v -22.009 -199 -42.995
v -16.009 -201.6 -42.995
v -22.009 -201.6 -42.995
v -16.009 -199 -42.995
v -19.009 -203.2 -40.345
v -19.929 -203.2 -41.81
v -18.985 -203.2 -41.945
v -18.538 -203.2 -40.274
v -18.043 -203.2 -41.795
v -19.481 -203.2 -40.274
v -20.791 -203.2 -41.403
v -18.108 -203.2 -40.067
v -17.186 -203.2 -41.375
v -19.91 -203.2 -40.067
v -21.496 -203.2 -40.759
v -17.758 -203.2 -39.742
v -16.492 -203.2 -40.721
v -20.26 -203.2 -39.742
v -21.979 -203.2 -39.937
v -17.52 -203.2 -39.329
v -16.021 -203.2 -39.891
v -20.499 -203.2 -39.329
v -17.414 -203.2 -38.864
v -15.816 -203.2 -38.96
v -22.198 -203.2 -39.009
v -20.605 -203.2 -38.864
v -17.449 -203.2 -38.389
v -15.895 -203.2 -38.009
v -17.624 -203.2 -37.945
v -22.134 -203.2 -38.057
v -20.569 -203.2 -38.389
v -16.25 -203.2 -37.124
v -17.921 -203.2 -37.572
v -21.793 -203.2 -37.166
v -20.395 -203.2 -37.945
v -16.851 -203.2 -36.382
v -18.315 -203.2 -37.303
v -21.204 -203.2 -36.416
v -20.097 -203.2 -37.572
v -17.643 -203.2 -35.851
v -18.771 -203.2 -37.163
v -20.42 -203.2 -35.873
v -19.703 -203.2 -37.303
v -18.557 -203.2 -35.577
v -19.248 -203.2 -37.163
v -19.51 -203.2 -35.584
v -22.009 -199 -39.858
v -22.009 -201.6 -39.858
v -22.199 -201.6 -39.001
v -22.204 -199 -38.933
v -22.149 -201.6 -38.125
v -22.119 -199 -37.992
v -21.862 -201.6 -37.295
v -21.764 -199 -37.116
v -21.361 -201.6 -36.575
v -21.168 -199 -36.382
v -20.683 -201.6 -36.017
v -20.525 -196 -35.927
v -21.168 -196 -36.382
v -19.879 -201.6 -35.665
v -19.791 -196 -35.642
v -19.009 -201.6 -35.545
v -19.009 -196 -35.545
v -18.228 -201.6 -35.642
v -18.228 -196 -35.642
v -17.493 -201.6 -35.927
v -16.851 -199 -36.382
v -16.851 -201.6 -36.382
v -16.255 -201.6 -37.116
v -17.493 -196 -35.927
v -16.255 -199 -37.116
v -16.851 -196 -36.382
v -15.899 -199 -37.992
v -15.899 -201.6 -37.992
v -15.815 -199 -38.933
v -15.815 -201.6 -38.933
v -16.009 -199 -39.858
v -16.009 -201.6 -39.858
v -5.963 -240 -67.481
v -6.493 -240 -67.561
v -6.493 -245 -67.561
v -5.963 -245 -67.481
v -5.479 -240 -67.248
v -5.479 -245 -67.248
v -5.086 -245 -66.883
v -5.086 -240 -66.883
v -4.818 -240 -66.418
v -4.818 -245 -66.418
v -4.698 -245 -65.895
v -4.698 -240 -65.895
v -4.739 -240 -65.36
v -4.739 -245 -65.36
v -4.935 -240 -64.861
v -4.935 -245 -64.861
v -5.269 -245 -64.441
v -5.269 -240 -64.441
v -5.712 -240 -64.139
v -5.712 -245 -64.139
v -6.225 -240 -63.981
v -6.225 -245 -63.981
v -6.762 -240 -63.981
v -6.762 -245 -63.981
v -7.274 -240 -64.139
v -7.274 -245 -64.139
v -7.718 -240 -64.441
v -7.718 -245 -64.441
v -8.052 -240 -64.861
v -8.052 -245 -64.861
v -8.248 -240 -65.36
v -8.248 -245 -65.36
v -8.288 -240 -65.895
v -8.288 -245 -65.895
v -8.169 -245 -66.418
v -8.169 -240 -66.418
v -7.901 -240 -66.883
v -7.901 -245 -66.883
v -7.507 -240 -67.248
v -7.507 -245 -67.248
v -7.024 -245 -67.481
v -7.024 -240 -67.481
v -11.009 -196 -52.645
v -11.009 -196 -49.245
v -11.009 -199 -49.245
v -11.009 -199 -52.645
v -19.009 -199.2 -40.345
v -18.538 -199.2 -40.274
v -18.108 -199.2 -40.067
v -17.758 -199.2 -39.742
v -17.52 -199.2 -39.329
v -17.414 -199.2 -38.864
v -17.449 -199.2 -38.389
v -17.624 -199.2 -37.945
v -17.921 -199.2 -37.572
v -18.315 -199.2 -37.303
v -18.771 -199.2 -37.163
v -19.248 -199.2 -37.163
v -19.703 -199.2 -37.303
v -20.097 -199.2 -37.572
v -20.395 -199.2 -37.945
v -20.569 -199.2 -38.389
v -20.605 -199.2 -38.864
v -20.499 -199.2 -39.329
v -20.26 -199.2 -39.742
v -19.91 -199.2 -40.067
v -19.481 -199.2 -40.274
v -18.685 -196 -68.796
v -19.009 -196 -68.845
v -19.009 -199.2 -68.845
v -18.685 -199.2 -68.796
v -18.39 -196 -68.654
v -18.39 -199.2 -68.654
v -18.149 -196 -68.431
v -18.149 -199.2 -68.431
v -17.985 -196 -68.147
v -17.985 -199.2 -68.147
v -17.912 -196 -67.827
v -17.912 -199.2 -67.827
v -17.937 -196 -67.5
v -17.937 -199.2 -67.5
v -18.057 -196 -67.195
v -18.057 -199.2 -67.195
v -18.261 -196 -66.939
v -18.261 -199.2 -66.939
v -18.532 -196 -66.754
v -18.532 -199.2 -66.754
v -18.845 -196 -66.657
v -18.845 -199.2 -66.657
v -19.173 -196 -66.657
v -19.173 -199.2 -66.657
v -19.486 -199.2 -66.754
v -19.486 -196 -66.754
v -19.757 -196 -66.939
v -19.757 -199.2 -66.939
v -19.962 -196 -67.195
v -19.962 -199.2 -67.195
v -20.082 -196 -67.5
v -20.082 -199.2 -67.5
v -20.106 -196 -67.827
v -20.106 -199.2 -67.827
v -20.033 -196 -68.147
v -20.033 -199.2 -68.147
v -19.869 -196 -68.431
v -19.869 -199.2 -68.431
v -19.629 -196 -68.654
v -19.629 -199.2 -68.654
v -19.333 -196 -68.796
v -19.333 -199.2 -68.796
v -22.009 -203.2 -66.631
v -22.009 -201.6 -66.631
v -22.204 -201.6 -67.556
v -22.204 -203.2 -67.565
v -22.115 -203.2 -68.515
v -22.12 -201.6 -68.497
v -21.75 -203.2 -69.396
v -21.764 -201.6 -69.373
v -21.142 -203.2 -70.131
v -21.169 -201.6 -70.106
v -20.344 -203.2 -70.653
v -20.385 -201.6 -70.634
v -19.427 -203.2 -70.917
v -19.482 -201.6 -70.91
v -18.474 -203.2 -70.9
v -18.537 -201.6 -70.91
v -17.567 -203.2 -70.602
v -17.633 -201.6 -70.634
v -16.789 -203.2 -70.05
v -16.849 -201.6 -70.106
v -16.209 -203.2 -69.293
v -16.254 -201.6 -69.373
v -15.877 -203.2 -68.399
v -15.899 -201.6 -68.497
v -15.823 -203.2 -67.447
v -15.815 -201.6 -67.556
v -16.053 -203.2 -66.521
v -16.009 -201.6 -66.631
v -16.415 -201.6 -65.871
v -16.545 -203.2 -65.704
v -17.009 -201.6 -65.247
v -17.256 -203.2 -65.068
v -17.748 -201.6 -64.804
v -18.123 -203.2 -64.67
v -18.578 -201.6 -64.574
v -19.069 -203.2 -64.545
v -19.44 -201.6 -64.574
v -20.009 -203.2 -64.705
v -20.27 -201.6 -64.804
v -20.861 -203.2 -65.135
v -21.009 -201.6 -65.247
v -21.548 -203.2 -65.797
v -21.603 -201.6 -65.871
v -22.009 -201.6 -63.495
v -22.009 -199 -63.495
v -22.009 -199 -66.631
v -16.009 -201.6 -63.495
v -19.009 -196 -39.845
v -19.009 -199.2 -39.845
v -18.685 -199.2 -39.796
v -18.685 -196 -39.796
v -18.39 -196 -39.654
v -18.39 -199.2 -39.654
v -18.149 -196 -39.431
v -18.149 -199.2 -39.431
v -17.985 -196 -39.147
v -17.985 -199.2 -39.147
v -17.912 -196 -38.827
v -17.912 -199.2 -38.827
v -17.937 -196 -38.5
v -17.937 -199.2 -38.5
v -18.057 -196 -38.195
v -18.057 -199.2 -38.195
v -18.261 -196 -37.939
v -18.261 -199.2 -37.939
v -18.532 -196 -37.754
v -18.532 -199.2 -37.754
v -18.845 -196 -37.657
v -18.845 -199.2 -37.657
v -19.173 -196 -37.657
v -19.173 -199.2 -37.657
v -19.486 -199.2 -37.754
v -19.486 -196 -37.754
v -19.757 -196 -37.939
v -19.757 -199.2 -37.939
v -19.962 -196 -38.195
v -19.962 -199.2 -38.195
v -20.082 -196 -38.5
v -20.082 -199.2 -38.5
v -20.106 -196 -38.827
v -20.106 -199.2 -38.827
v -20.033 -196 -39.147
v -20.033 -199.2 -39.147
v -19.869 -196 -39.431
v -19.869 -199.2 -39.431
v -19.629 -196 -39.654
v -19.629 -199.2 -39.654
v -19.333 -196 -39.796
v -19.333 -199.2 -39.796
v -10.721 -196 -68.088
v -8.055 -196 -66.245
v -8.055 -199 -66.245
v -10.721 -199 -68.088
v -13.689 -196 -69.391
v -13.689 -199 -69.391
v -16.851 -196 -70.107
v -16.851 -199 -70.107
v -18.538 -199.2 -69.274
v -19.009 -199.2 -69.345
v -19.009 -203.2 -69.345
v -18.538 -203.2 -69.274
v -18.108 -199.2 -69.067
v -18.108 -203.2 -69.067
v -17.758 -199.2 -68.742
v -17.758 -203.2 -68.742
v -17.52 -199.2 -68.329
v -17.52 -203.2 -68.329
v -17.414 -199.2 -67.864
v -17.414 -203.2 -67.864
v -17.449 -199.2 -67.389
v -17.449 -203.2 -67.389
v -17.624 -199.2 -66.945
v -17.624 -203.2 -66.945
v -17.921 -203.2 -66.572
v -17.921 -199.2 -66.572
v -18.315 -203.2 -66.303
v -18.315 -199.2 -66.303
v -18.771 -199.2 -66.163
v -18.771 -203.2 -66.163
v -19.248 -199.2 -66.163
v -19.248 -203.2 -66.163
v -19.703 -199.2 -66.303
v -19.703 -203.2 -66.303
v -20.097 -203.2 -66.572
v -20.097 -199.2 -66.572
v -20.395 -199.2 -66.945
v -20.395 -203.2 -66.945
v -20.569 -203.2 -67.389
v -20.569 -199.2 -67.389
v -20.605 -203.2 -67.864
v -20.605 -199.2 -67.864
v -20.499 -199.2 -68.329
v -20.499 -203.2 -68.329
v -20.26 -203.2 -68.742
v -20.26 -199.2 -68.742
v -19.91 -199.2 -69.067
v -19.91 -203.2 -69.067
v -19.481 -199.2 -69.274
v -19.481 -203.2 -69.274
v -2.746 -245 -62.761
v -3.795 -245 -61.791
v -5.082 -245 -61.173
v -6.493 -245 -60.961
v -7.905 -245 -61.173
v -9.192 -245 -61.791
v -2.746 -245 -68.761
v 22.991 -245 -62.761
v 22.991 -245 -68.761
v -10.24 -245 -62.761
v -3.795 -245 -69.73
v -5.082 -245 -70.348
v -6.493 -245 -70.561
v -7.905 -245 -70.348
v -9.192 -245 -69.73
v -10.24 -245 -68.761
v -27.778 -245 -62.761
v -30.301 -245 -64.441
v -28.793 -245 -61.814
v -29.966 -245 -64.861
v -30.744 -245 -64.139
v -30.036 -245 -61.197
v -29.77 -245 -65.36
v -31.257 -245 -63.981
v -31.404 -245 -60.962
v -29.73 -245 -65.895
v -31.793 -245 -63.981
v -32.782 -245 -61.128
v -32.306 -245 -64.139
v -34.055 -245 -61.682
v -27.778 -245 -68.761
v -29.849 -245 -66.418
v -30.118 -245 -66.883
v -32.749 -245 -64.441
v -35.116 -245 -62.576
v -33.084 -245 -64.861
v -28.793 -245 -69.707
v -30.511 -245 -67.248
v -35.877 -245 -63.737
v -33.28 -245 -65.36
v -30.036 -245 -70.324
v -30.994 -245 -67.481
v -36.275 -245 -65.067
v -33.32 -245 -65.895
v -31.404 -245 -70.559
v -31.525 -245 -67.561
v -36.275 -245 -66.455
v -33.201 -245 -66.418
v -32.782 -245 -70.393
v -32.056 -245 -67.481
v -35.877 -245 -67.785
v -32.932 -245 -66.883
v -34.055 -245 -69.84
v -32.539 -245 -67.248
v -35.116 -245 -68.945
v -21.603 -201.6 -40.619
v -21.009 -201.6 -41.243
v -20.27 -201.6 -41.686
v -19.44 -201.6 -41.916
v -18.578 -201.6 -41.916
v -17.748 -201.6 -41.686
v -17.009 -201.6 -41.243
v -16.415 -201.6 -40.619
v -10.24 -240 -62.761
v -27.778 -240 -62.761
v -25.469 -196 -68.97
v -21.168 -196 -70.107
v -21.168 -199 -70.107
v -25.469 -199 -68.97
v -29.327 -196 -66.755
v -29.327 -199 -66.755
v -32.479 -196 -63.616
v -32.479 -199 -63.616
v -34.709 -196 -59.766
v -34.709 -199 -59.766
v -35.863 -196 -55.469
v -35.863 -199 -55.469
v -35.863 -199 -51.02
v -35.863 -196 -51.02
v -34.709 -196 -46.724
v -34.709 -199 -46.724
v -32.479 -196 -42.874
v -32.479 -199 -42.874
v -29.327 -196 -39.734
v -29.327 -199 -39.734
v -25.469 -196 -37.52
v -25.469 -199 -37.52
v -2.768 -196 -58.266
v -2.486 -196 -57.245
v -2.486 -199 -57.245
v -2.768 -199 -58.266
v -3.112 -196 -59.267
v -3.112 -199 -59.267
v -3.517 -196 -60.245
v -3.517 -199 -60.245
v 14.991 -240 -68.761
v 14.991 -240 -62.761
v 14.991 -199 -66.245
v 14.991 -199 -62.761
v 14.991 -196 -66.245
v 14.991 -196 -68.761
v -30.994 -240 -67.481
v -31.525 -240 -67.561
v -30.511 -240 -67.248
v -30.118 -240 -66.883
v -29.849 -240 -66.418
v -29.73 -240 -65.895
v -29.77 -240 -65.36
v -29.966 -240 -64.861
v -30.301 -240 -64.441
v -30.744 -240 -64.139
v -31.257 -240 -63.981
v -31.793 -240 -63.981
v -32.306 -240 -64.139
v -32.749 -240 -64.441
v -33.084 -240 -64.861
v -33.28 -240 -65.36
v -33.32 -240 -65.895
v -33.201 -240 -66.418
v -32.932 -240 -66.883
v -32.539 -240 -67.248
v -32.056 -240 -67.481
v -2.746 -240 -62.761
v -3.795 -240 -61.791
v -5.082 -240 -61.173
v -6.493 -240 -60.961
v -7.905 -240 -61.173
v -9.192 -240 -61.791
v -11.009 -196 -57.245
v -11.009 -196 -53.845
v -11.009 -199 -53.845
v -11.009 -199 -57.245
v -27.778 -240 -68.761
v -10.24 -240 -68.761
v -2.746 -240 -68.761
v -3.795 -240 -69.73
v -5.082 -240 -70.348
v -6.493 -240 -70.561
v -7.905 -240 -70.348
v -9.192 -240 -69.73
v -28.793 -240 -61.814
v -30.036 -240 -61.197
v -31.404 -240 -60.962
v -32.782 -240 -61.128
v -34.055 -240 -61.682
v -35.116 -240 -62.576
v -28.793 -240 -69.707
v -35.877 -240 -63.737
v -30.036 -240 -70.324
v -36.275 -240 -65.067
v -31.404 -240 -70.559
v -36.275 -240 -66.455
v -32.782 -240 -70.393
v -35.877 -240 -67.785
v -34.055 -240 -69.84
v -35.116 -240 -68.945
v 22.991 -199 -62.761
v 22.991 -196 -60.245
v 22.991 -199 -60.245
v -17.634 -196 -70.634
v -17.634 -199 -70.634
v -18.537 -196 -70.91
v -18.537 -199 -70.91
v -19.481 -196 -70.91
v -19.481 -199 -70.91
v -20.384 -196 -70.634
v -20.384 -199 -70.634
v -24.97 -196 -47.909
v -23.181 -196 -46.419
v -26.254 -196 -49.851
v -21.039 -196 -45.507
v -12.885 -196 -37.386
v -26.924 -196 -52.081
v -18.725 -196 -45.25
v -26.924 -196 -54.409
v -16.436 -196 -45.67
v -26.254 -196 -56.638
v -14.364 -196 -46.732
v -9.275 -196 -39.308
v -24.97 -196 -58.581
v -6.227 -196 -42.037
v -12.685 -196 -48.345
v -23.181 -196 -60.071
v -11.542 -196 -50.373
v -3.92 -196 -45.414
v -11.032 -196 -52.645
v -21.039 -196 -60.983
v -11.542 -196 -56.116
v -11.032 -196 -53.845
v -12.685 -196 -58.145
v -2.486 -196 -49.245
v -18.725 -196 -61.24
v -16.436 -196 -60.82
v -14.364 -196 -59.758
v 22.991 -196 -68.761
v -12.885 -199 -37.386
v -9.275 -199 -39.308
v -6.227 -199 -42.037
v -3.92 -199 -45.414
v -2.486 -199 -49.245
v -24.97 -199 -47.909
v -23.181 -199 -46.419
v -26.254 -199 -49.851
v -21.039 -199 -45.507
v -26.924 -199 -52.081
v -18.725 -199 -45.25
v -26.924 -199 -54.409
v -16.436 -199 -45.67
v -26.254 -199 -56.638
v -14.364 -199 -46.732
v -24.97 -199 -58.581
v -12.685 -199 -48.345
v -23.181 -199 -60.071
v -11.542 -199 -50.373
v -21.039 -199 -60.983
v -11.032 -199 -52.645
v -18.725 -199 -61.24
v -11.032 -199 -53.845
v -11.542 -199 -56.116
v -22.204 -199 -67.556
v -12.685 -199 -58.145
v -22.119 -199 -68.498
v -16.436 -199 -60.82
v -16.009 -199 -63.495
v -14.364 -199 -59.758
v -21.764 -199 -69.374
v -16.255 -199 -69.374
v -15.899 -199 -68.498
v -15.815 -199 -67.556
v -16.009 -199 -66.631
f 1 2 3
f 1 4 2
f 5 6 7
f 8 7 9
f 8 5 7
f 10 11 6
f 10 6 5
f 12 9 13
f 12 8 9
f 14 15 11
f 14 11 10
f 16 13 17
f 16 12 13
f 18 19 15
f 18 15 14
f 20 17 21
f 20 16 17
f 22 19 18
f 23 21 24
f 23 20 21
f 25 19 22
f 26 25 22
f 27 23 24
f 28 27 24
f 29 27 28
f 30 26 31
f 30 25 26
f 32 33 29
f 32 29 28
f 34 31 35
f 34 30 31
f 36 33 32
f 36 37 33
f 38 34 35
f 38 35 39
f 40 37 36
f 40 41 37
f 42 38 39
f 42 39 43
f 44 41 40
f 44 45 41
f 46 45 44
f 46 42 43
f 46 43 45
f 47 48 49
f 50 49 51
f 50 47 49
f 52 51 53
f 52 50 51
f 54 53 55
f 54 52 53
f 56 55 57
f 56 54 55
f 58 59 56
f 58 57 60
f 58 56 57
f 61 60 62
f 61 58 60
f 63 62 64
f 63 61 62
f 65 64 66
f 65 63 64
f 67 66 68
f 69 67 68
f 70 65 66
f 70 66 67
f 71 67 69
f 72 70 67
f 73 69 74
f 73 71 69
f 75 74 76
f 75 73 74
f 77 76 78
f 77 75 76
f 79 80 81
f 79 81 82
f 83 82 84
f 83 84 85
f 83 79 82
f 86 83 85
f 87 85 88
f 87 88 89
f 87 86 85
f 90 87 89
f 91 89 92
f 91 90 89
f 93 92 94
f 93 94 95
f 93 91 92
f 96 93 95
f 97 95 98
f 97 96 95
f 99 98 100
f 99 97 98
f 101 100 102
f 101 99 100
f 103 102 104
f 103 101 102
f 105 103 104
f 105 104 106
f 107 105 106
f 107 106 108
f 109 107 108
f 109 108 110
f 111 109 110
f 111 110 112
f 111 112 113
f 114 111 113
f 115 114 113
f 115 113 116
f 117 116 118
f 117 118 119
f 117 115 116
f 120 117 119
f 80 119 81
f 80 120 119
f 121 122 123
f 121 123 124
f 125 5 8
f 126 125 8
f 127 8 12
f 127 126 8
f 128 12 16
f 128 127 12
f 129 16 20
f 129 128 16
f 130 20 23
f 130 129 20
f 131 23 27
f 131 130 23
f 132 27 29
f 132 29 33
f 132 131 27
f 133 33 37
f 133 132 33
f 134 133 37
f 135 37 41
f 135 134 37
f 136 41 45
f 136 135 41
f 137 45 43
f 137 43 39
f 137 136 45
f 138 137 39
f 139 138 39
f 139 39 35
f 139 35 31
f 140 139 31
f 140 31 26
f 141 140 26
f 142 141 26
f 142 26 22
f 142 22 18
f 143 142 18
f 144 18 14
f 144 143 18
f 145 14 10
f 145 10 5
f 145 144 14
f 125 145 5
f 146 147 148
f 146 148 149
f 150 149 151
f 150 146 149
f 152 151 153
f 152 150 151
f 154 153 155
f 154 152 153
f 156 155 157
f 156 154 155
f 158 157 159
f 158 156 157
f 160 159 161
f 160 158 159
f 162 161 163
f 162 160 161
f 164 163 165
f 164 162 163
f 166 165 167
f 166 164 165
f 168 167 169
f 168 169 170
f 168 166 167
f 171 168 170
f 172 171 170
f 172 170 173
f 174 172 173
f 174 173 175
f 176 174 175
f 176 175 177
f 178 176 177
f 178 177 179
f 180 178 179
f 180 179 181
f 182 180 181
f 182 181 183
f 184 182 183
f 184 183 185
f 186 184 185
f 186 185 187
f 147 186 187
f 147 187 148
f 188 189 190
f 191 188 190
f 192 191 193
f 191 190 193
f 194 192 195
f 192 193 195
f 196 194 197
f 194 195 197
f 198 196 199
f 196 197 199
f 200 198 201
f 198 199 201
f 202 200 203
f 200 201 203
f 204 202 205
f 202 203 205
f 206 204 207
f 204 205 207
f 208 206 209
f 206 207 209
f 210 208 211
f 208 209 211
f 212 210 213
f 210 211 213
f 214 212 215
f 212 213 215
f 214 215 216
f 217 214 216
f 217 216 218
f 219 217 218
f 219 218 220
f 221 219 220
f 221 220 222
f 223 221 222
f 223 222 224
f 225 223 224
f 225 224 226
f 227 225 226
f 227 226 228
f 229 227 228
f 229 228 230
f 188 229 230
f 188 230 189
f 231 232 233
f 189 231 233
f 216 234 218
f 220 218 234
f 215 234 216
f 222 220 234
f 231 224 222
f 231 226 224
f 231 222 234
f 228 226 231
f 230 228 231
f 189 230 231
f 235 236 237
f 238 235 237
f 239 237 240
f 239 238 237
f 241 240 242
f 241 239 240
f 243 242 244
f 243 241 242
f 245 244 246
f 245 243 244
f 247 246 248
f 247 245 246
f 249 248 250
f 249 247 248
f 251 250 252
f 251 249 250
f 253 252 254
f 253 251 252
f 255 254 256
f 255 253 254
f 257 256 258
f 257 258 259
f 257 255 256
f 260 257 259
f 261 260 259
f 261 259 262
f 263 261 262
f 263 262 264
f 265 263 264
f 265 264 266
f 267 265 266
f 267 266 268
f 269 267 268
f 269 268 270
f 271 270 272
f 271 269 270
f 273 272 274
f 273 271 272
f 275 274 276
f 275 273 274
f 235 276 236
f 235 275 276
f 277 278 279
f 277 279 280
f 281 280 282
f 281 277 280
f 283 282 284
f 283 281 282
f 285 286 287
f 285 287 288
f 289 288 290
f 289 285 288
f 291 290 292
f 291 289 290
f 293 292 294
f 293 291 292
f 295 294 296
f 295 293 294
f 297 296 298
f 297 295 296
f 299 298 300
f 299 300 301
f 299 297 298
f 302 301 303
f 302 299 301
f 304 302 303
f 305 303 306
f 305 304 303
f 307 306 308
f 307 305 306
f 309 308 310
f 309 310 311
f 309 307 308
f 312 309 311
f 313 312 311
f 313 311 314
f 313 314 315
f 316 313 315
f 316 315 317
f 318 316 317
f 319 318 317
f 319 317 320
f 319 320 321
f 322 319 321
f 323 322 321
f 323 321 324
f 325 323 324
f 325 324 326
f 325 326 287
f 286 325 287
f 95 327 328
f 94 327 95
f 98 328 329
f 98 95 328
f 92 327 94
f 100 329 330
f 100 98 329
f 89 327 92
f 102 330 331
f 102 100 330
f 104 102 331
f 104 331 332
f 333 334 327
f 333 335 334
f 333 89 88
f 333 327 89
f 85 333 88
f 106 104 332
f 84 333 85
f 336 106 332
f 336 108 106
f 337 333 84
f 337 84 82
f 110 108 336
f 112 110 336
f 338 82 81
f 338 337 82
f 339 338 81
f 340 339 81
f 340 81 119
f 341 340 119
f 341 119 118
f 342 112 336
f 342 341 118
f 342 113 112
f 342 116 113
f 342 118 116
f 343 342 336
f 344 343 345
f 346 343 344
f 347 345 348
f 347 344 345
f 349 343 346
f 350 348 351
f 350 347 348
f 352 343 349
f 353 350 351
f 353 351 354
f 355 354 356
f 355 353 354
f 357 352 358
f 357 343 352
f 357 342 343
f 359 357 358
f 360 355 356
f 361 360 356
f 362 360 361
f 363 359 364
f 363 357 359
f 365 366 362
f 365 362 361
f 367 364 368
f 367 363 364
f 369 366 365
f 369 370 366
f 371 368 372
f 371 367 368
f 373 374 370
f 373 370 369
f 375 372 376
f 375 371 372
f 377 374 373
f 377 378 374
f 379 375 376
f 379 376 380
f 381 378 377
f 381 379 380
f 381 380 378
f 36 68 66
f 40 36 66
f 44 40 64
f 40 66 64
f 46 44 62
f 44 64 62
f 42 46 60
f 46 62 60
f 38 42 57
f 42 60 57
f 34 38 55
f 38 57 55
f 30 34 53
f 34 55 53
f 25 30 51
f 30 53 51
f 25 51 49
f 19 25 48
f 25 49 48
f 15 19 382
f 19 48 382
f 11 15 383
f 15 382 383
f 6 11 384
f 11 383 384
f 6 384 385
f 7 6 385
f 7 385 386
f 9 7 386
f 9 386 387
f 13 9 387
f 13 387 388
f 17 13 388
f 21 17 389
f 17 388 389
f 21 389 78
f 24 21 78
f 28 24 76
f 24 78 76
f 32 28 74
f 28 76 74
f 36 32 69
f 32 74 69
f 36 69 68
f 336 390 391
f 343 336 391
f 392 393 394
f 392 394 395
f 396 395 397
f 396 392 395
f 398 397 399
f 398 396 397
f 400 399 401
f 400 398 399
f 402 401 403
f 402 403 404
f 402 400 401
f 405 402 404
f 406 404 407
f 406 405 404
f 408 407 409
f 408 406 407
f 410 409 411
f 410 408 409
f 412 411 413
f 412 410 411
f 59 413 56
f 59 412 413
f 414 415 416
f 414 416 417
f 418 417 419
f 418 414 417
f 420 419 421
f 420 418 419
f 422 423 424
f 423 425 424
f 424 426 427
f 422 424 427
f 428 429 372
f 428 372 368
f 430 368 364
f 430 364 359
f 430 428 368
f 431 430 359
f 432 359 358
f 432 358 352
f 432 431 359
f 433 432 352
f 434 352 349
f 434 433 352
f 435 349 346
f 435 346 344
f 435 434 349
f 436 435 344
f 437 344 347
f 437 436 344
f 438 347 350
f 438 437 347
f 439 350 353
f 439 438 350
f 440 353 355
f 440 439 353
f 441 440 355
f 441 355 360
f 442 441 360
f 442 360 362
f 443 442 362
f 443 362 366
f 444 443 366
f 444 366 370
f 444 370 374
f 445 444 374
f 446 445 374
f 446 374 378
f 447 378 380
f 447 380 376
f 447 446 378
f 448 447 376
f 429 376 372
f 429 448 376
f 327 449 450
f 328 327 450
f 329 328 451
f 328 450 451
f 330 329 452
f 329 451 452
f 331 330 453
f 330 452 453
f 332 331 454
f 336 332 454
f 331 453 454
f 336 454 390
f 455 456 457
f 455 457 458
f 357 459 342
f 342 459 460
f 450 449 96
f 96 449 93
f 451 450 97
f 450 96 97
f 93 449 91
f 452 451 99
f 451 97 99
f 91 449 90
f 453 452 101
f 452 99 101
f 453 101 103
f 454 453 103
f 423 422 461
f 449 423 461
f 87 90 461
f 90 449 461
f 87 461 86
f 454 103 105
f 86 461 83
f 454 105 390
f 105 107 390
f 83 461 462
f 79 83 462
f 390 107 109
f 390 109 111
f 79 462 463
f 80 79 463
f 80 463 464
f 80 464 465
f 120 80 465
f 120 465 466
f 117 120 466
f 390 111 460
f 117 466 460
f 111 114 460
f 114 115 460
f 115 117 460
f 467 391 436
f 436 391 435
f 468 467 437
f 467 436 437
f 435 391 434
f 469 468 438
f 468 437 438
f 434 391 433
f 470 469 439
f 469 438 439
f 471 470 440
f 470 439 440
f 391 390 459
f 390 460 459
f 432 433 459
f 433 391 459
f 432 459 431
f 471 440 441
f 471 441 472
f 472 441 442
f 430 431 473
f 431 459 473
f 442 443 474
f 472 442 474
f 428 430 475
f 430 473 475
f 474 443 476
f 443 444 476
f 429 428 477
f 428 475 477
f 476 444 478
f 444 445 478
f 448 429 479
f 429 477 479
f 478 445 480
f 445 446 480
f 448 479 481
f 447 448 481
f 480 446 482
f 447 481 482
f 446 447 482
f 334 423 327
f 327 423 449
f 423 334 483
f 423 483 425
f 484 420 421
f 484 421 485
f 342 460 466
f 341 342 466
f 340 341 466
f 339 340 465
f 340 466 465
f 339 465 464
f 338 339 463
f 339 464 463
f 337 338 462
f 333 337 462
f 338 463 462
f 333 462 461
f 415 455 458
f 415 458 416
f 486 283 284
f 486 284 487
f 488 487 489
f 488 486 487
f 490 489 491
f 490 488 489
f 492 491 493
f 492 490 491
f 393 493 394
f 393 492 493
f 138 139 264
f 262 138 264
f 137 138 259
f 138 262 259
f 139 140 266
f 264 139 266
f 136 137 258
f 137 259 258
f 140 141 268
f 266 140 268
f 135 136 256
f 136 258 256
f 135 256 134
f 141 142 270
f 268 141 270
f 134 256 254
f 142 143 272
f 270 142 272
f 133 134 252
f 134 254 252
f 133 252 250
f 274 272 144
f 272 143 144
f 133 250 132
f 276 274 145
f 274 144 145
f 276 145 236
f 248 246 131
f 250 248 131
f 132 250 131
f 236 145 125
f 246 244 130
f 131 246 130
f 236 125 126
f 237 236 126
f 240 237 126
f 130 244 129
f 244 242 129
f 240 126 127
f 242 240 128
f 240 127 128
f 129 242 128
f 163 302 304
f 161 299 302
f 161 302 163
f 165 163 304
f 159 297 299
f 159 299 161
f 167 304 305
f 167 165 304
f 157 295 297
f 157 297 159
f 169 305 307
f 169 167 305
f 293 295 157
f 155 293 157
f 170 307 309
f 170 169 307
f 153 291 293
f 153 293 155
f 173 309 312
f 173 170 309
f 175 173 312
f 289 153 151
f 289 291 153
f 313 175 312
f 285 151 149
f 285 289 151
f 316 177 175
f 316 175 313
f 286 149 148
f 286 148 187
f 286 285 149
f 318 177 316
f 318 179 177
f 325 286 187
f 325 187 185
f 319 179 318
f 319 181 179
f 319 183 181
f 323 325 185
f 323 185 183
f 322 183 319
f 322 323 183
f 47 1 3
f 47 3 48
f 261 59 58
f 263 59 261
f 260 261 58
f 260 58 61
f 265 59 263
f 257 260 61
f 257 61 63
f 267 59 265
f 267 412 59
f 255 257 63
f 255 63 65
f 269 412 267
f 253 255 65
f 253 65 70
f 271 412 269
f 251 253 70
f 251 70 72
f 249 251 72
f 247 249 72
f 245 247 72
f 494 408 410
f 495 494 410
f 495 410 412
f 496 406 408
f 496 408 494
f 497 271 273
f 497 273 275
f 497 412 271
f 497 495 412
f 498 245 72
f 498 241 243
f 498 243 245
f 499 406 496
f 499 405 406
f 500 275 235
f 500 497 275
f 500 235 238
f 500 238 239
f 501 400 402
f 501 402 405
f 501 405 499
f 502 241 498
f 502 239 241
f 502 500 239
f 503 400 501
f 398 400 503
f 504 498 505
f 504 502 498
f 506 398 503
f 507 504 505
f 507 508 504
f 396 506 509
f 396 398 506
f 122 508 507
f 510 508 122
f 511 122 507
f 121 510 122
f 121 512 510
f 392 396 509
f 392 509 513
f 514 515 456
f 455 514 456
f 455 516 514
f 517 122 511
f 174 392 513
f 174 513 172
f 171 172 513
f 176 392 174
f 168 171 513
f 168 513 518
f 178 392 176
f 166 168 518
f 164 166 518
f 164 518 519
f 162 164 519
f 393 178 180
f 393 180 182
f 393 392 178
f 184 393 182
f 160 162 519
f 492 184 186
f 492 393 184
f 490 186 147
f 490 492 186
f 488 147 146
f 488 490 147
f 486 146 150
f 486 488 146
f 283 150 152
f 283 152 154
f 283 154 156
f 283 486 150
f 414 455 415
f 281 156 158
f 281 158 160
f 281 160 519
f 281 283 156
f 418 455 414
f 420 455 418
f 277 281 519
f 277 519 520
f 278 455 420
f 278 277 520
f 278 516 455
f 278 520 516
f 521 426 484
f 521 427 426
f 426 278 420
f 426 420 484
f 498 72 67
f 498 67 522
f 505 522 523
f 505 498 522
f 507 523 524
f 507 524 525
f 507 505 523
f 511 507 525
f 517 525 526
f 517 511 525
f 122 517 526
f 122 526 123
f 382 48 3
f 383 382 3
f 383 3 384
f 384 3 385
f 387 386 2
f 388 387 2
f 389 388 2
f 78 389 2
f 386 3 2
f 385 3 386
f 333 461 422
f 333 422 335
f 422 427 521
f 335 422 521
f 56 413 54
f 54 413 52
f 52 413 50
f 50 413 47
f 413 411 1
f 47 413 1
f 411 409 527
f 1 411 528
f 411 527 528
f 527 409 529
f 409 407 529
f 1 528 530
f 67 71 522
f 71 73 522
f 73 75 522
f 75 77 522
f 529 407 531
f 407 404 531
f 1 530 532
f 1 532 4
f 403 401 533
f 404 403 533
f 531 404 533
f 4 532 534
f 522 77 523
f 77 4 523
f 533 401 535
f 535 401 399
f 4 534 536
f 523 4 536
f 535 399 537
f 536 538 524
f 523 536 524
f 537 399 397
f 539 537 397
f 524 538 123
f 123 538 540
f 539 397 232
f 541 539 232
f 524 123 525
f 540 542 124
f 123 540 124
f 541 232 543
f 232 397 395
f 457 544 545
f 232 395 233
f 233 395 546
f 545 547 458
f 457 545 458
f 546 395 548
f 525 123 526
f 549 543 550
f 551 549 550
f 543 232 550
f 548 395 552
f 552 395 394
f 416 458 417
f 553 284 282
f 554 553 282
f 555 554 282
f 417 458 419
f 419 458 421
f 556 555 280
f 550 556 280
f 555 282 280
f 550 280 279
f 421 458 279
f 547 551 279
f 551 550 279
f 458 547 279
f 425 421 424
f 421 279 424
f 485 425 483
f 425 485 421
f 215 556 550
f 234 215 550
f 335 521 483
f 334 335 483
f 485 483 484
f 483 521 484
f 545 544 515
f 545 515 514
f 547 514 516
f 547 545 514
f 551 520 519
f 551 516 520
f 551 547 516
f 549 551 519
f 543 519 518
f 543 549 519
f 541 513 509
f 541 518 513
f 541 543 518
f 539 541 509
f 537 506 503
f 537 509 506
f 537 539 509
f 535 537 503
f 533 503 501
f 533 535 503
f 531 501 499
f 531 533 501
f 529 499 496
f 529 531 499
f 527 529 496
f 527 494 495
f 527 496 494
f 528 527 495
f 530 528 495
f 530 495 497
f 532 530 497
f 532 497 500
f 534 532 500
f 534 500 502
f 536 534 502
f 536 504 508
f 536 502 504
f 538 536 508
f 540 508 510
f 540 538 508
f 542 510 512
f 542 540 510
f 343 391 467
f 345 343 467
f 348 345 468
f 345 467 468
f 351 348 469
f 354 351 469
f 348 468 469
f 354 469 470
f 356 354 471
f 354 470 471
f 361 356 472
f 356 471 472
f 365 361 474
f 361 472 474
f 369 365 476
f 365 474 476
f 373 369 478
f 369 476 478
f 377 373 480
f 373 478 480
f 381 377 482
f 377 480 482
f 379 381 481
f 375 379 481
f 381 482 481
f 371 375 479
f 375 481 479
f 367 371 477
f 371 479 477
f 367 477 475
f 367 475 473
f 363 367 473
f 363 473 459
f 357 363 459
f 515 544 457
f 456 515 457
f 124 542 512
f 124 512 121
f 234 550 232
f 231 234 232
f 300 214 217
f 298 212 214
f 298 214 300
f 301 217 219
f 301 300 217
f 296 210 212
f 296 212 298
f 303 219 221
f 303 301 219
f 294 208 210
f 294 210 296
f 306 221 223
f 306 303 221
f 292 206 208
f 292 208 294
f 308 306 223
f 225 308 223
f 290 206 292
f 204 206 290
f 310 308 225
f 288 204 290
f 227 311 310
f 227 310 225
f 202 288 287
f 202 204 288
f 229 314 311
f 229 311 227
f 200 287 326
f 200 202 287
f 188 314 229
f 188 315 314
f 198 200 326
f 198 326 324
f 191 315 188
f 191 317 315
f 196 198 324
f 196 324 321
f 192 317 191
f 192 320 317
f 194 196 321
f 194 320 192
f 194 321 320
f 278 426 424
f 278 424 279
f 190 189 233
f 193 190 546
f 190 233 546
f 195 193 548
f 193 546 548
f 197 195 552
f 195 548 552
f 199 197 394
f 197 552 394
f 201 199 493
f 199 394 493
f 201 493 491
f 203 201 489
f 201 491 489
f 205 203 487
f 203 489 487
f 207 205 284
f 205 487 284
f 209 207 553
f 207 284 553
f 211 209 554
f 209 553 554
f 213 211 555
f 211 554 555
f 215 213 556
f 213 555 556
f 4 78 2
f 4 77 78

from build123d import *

# Parameters (mm, degrees)
MAIN_PROFILE_SKETCH_R            = 1.1
MAIN_EXTRUSION_DEPTH             = 3
DETAIL_PROFILE_2_SKETCH_R        = 1.1
DETAIL_PROFILE_2_SKETCH_W        = 8
DETAIL_PROFILE_2_SKETCH_H        = 6
DETAIL_EXTRUSION_2_DEPTH         = 0.2
DETAIL_PROFILE_3_SKETCH_R        = 1.6
DETAIL_PROFILE_3_SKETCH_W        = 8
DETAIL_PROFILE_3_SKETCH_H        = 6
DETAIL_EXTRUSION_3_DEPTH         = 2.4
DETAIL_PROFILE_4_SKETCH_R        = 3.2
DETAIL_PROFILE_4_SKETCH_R_2      = 1.6
DETAIL_PROFILE_4_SKETCH_W        = 8
DETAIL_PROFILE_4_SKETCH_H        = 6
DETAIL_EXTRUSION_4_DEPTH         = 1.6
DETAIL_PROFILE_5_SKETCH_W        = 8
DETAIL_PROFILE_5_SKETCH_H        = 6
DETAIL_EXTRUSION_5_DEPTH         = 36.8
DETAIL_PROFILE_6_SKETCH_R        = 1.8
DETAIL_EXTRUSION_6_DEPTH         = 5
CENTRE_BORE_RELIEF_SLOT_SKETCH_W = 9
CENTRE_BORE_RELIEF_SLOT_SKETCH_H = 1.2
CENTRE_BORE_RELIEF_SLOT_DEPTH    = 3.2
ENCODER_CENTRE_OPENING_PROFILE_R = 8
ENCODER_CENTRE_OPENING_DEPTH     = 3.2


with BuildPart() as part:
    # Main Profile Sketch → Main Extrusion (new body)
    with BuildSketch(Plane(origin=(0, -196, 0), x_dir=(-1, 0, 0), z_dir=(0, -1, 0))):
        with BuildLine():
            Line((-14.990817117, 66.244882879), (8.054731733, 66.244882879))
            ThreePointArc((8.054731733, 66.244882879), (12.174217777, 68.810333467), (16.850710954, 70.107296672))
            ThreePointArc((16.850710954, 70.107296672), (19.009182883, 70.944882879), (21.167654813, 70.107296672))
            ThreePointArc((21.167654813, 70.107296672), (36.009182883, 53.244882879), (21.167654813, 36.382469086))
            ThreePointArc((21.167654813, 36.382469086), (20.166826149, 35.761619218), (19.009182883, 35.544882879))
            ThreePointArc((19.009182883, 35.544882879), (17.851539617, 35.761619218), (16.850710954, 36.382469086))
            ThreePointArc((16.850710954, 36.382469086), (7.668676852, 40.580250119), (2.486471241, 49.244882879))
            Line((2.486471241, 49.244882879), (11.009182883, 49.244882879))
            Line((11.009182883, 49.244882879), (11.009182883, 53.244882879))
            Line((11.009182883, 53.244882879), (11.009182883, 57.244882879))
            Line((11.009182883, 57.244882879), (2.486471241, 57.244882879))
            ThreePointArc((2.486471241, 57.244882879), (2.931733644, 58.768977914), (3.517249498, 60.244882879))
            Line((3.517249498, 60.244882879), (-22.990817117, 60.244882879))
            Line((-22.990817117, 60.244882879), (-22.990817117, 68.760672906))
            Line((-22.990817117, 68.760672906), (-14.990817117, 68.760672906))
            Line((-14.990817117, 68.760672906), (-14.990817117, 66.244882879))
        make_face()
        with Locations(Location((19.009182883, 67.744882879, 0), (0, 0, 90))):
            Circle(MAIN_PROFILE_SKETCH_R, mode=Mode.SUBTRACT)
        with Locations(Location((19.009182883, 38.744882879, 0), (0, 0, 90))):
            Circle(MAIN_PROFILE_SKETCH_R, mode=Mode.SUBTRACT)
    extrude(amount=MAIN_EXTRUSION_DEPTH)

    # Detail Profile 2 Sketch → Detail Extrusion 2 (add)
    # profile 1 of 3: a face of its own
    with BuildSketch(Plane(origin=(0, -199, 0), x_dir=(-1, 0, 0), z_dir=(0, -1, 0))):
        with BuildLine():
            Line((16.009182883, 42.994882879), (22.009182883, 42.994882879))
            Line((22.009182883, 42.994882879), (22.009182883, 39.858435751))
            ThreePointArc((22.009182883, 39.858435751), (21.636288628, 36.917777134), (19.009182883, 35.544882879))
            ThreePointArc((19.009182883, 35.544882879), (16.382077138, 36.917777134), (16.009182883, 39.858435751))
            Line((16.009182883, 39.858435751), (16.009182883, 42.994882879))
        make_face()
        with Locations(Location((19.009182883, 38.744882879, 0), (0, 0, 90))):
            Circle(DETAIL_PROFILE_2_SKETCH_R, mode=Mode.SUBTRACT)
    # profile 2 of 3: a face of its own
    with BuildSketch(Plane(origin=(0, -199, 0), x_dir=(-1, 0, 0), z_dir=(0, -1, 0))):
        with Locations((-18.990817117, 65.760672906)):
            Rectangle(DETAIL_PROFILE_2_SKETCH_W, DETAIL_PROFILE_2_SKETCH_H)
    # profile 3 of 3: a face of its own
    with BuildSketch(Plane(origin=(0, -199, 0), x_dir=(-1, 0, 0), z_dir=(0, -1, 0))):
        with BuildLine():
            Line((16.009182883, 66.631330006), (16.009182883, 63.494882879))
            Line((16.009182883, 63.494882879), (22.009182883, 63.494882879))
            Line((22.009182883, 63.494882879), (22.009182883, 66.631330006))
            ThreePointArc((22.009182883, 66.631330006), (19.009182883, 70.944882879), (16.009182883, 66.631330006))
        make_face()
        with Locations(Location((19.009182883, 67.744882879, 0), (0, 0, 90))):
            Circle(DETAIL_PROFILE_2_SKETCH_R, mode=Mode.SUBTRACT)
    extrude(amount=DETAIL_EXTRUSION_2_DEPTH)

    # Detail Profile 3 Sketch → Detail Extrusion 3 (add)
    # profile 1 of 3: a face of its own
    with BuildSketch(Plane(origin=(0, -199.2, 0), x_dir=(-1, 0, 0), z_dir=(0, -1, 0))):
        with BuildLine():
            Line((16.009182883, 42.994882879), (22.009182883, 42.994882879))
            Line((22.009182883, 42.994882879), (22.009182883, 39.858435751))
            ThreePointArc((22.009182883, 39.858435751), (21.636288628, 36.917777134), (19.009182883, 35.544882879))
            ThreePointArc((19.009182883, 35.544882879), (16.382077138, 36.917777134), (16.009182883, 39.858435751))
            Line((16.009182883, 39.858435751), (16.009182883, 42.994882879))
        make_face()
        with Locations(Location((19.009182883, 38.744882879, 0), (0, 0, 90))):
            Circle(DETAIL_PROFILE_3_SKETCH_R, mode=Mode.SUBTRACT)
    # profile 2 of 3: a face of its own
    with BuildSketch(Plane(origin=(0, -199.2, 0), x_dir=(-1, 0, 0), z_dir=(0, -1, 0))):
        with Locations((-18.990817117, 65.760672906)):
            Rectangle(DETAIL_PROFILE_3_SKETCH_W, DETAIL_PROFILE_3_SKETCH_H)
    # profile 3 of 3: a face of its own
    with BuildSketch(Plane(origin=(0, -199.2, 0), x_dir=(-1, 0, 0), z_dir=(0, -1, 0))):
        with BuildLine():
            Line((16.009182883, 66.631330006), (16.009182883, 63.494882879))
            Line((16.009182883, 63.494882879), (22.009182883, 63.494882879))
            Line((22.009182883, 63.494882879), (22.009182883, 66.631330006))
            ThreePointArc((22.009182883, 66.631330006), (19.009182883, 70.944882879), (16.009182883, 66.631330006))
        make_face()
        with Locations(Location((19.009182883, 67.744882879, 0), (0, 0, 90))):
            Circle(DETAIL_PROFILE_3_SKETCH_R, mode=Mode.SUBTRACT)
    extrude(amount=DETAIL_EXTRUSION_3_DEPTH)

    # Detail Profile 4 Sketch → Detail Extrusion 4 (add)
    # profile 1 of 3: a face of its own
    with BuildSketch(Plane(origin=(0, -201.6, 0), x_dir=(-1, 0, 0), z_dir=(0, -1, 0))):
        with Locations(Location((19.009182883, 38.744882879, 0), (0, 0, 227.582921153))):
            Circle(DETAIL_PROFILE_4_SKETCH_R)
        with Locations(Location((19.009182883, 38.744882879, 0), (0, 0, 90))):
            Circle(DETAIL_PROFILE_4_SKETCH_R_2, mode=Mode.SUBTRACT)
    # profile 2 of 3: a face of its own
    with BuildSketch(Plane(origin=(0, -201.6, 0), x_dir=(-1, 0, 0), z_dir=(0, -1, 0))):
        with Locations(Location((19.009182883, 67.744882879, 0), (0, 0, 339.635865194))):
            Circle(DETAIL_PROFILE_4_SKETCH_R)
        with Locations(Location((19.009182883, 67.744882879, 0), (0, 0, 90))):
            Circle(DETAIL_PROFILE_4_SKETCH_R_2, mode=Mode.SUBTRACT)
    # profile 3 of 3: a face of its own
    with BuildSketch(Plane(origin=(0, -201.6, 0), x_dir=(-1, 0, 0), z_dir=(0, -1, 0))):
        with Locations((-18.990817117, 65.760672906)):
            Rectangle(DETAIL_PROFILE_4_SKETCH_W, DETAIL_PROFILE_4_SKETCH_H)
    extrude(amount=DETAIL_EXTRUSION_4_DEPTH)

    # Detail Profile 5 Sketch → Detail Extrusion 5 (add)
    with BuildSketch(Plane(origin=(0, -203.2, 0), x_dir=(-1, 0, 0), z_dir=(0, -1, 0))):
        with Locations((-18.990817117, 65.760672906)):
            Rectangle(DETAIL_PROFILE_5_SKETCH_W, DETAIL_PROFILE_5_SKETCH_H)
    extrude(amount=DETAIL_EXTRUSION_5_DEPTH)

    # Detail Profile 6 Sketch → Detail Extrusion 6 (add)
    with BuildSketch(Plane(origin=(0, -240, 0), x_dir=(-1, 0, 0), z_dir=(0, -1, 0))):
        with BuildLine():
            Line((-22.990817117, 62.760672906), (2.746394057, 62.760672906))
            ThreePointArc((2.746394057, 62.760672906), (6.493392856, 60.960672906), (10.240391655, 62.760672906))
            Line((10.240391655, 62.760672906), (27.777974111, 62.760672906))
            ThreePointArc((27.777974111, 62.760672906), (36.32497291, 65.760672906), (27.777974111, 68.760672906))
            Line((27.777974111, 68.760672906), (10.240391655, 68.760672906))
            ThreePointArc((10.240391655, 68.760672906), (6.493392856, 70.560672906), (2.746394057, 68.760672906))
            Line((2.746394057, 68.760672906), (-22.990817117, 68.760672906))
            Line((-22.990817117, 68.760672906), (-22.990817117, 62.760672906))
        make_face()
        with Locations(Location((31.52497291, 65.760672906, 0), (0, 0, 90))):
            Circle(DETAIL_PROFILE_6_SKETCH_R, mode=Mode.SUBTRACT)
        with Locations(Location((6.493392856, 65.760672906, 0), (0, 0, 90))):
            Circle(DETAIL_PROFILE_6_SKETCH_R, mode=Mode.SUBTRACT)
    extrude(amount=DETAIL_EXTRUSION_6_DEPTH)

    # Centre Bore Relief Slot Sketch → Centre Bore Relief Slot (cut)
    with BuildSketch(Plane(origin=(0, -199.1, 0), x_dir=(1, 0, 0), z_dir=(0, 1, 0))):
        with Locations((-14.509182883, 53.244882879)):
            Rectangle(CENTRE_BORE_RELIEF_SLOT_SKETCH_W, CENTRE_BORE_RELIEF_SLOT_SKETCH_H)
    extrude(amount=CENTRE_BORE_RELIEF_SLOT_DEPTH, mode=Mode.SUBTRACT)

    # Encoder Centre Opening profile → Encoder Centre Opening (cut)
    with BuildSketch(Plane(origin=(0, -199.1, 0), x_dir=(1, 0, 0), z_dir=(0, 1, 0))):
        with Locations((-19.009182883, 53.244882879)):
            Circle(ENCODER_CENTRE_OPENING_PROFILE_R)
    extrude(amount=ENCODER_CENTRE_OPENING_DEPTH, mode=Mode.SUBTRACT)


solid = part.part
